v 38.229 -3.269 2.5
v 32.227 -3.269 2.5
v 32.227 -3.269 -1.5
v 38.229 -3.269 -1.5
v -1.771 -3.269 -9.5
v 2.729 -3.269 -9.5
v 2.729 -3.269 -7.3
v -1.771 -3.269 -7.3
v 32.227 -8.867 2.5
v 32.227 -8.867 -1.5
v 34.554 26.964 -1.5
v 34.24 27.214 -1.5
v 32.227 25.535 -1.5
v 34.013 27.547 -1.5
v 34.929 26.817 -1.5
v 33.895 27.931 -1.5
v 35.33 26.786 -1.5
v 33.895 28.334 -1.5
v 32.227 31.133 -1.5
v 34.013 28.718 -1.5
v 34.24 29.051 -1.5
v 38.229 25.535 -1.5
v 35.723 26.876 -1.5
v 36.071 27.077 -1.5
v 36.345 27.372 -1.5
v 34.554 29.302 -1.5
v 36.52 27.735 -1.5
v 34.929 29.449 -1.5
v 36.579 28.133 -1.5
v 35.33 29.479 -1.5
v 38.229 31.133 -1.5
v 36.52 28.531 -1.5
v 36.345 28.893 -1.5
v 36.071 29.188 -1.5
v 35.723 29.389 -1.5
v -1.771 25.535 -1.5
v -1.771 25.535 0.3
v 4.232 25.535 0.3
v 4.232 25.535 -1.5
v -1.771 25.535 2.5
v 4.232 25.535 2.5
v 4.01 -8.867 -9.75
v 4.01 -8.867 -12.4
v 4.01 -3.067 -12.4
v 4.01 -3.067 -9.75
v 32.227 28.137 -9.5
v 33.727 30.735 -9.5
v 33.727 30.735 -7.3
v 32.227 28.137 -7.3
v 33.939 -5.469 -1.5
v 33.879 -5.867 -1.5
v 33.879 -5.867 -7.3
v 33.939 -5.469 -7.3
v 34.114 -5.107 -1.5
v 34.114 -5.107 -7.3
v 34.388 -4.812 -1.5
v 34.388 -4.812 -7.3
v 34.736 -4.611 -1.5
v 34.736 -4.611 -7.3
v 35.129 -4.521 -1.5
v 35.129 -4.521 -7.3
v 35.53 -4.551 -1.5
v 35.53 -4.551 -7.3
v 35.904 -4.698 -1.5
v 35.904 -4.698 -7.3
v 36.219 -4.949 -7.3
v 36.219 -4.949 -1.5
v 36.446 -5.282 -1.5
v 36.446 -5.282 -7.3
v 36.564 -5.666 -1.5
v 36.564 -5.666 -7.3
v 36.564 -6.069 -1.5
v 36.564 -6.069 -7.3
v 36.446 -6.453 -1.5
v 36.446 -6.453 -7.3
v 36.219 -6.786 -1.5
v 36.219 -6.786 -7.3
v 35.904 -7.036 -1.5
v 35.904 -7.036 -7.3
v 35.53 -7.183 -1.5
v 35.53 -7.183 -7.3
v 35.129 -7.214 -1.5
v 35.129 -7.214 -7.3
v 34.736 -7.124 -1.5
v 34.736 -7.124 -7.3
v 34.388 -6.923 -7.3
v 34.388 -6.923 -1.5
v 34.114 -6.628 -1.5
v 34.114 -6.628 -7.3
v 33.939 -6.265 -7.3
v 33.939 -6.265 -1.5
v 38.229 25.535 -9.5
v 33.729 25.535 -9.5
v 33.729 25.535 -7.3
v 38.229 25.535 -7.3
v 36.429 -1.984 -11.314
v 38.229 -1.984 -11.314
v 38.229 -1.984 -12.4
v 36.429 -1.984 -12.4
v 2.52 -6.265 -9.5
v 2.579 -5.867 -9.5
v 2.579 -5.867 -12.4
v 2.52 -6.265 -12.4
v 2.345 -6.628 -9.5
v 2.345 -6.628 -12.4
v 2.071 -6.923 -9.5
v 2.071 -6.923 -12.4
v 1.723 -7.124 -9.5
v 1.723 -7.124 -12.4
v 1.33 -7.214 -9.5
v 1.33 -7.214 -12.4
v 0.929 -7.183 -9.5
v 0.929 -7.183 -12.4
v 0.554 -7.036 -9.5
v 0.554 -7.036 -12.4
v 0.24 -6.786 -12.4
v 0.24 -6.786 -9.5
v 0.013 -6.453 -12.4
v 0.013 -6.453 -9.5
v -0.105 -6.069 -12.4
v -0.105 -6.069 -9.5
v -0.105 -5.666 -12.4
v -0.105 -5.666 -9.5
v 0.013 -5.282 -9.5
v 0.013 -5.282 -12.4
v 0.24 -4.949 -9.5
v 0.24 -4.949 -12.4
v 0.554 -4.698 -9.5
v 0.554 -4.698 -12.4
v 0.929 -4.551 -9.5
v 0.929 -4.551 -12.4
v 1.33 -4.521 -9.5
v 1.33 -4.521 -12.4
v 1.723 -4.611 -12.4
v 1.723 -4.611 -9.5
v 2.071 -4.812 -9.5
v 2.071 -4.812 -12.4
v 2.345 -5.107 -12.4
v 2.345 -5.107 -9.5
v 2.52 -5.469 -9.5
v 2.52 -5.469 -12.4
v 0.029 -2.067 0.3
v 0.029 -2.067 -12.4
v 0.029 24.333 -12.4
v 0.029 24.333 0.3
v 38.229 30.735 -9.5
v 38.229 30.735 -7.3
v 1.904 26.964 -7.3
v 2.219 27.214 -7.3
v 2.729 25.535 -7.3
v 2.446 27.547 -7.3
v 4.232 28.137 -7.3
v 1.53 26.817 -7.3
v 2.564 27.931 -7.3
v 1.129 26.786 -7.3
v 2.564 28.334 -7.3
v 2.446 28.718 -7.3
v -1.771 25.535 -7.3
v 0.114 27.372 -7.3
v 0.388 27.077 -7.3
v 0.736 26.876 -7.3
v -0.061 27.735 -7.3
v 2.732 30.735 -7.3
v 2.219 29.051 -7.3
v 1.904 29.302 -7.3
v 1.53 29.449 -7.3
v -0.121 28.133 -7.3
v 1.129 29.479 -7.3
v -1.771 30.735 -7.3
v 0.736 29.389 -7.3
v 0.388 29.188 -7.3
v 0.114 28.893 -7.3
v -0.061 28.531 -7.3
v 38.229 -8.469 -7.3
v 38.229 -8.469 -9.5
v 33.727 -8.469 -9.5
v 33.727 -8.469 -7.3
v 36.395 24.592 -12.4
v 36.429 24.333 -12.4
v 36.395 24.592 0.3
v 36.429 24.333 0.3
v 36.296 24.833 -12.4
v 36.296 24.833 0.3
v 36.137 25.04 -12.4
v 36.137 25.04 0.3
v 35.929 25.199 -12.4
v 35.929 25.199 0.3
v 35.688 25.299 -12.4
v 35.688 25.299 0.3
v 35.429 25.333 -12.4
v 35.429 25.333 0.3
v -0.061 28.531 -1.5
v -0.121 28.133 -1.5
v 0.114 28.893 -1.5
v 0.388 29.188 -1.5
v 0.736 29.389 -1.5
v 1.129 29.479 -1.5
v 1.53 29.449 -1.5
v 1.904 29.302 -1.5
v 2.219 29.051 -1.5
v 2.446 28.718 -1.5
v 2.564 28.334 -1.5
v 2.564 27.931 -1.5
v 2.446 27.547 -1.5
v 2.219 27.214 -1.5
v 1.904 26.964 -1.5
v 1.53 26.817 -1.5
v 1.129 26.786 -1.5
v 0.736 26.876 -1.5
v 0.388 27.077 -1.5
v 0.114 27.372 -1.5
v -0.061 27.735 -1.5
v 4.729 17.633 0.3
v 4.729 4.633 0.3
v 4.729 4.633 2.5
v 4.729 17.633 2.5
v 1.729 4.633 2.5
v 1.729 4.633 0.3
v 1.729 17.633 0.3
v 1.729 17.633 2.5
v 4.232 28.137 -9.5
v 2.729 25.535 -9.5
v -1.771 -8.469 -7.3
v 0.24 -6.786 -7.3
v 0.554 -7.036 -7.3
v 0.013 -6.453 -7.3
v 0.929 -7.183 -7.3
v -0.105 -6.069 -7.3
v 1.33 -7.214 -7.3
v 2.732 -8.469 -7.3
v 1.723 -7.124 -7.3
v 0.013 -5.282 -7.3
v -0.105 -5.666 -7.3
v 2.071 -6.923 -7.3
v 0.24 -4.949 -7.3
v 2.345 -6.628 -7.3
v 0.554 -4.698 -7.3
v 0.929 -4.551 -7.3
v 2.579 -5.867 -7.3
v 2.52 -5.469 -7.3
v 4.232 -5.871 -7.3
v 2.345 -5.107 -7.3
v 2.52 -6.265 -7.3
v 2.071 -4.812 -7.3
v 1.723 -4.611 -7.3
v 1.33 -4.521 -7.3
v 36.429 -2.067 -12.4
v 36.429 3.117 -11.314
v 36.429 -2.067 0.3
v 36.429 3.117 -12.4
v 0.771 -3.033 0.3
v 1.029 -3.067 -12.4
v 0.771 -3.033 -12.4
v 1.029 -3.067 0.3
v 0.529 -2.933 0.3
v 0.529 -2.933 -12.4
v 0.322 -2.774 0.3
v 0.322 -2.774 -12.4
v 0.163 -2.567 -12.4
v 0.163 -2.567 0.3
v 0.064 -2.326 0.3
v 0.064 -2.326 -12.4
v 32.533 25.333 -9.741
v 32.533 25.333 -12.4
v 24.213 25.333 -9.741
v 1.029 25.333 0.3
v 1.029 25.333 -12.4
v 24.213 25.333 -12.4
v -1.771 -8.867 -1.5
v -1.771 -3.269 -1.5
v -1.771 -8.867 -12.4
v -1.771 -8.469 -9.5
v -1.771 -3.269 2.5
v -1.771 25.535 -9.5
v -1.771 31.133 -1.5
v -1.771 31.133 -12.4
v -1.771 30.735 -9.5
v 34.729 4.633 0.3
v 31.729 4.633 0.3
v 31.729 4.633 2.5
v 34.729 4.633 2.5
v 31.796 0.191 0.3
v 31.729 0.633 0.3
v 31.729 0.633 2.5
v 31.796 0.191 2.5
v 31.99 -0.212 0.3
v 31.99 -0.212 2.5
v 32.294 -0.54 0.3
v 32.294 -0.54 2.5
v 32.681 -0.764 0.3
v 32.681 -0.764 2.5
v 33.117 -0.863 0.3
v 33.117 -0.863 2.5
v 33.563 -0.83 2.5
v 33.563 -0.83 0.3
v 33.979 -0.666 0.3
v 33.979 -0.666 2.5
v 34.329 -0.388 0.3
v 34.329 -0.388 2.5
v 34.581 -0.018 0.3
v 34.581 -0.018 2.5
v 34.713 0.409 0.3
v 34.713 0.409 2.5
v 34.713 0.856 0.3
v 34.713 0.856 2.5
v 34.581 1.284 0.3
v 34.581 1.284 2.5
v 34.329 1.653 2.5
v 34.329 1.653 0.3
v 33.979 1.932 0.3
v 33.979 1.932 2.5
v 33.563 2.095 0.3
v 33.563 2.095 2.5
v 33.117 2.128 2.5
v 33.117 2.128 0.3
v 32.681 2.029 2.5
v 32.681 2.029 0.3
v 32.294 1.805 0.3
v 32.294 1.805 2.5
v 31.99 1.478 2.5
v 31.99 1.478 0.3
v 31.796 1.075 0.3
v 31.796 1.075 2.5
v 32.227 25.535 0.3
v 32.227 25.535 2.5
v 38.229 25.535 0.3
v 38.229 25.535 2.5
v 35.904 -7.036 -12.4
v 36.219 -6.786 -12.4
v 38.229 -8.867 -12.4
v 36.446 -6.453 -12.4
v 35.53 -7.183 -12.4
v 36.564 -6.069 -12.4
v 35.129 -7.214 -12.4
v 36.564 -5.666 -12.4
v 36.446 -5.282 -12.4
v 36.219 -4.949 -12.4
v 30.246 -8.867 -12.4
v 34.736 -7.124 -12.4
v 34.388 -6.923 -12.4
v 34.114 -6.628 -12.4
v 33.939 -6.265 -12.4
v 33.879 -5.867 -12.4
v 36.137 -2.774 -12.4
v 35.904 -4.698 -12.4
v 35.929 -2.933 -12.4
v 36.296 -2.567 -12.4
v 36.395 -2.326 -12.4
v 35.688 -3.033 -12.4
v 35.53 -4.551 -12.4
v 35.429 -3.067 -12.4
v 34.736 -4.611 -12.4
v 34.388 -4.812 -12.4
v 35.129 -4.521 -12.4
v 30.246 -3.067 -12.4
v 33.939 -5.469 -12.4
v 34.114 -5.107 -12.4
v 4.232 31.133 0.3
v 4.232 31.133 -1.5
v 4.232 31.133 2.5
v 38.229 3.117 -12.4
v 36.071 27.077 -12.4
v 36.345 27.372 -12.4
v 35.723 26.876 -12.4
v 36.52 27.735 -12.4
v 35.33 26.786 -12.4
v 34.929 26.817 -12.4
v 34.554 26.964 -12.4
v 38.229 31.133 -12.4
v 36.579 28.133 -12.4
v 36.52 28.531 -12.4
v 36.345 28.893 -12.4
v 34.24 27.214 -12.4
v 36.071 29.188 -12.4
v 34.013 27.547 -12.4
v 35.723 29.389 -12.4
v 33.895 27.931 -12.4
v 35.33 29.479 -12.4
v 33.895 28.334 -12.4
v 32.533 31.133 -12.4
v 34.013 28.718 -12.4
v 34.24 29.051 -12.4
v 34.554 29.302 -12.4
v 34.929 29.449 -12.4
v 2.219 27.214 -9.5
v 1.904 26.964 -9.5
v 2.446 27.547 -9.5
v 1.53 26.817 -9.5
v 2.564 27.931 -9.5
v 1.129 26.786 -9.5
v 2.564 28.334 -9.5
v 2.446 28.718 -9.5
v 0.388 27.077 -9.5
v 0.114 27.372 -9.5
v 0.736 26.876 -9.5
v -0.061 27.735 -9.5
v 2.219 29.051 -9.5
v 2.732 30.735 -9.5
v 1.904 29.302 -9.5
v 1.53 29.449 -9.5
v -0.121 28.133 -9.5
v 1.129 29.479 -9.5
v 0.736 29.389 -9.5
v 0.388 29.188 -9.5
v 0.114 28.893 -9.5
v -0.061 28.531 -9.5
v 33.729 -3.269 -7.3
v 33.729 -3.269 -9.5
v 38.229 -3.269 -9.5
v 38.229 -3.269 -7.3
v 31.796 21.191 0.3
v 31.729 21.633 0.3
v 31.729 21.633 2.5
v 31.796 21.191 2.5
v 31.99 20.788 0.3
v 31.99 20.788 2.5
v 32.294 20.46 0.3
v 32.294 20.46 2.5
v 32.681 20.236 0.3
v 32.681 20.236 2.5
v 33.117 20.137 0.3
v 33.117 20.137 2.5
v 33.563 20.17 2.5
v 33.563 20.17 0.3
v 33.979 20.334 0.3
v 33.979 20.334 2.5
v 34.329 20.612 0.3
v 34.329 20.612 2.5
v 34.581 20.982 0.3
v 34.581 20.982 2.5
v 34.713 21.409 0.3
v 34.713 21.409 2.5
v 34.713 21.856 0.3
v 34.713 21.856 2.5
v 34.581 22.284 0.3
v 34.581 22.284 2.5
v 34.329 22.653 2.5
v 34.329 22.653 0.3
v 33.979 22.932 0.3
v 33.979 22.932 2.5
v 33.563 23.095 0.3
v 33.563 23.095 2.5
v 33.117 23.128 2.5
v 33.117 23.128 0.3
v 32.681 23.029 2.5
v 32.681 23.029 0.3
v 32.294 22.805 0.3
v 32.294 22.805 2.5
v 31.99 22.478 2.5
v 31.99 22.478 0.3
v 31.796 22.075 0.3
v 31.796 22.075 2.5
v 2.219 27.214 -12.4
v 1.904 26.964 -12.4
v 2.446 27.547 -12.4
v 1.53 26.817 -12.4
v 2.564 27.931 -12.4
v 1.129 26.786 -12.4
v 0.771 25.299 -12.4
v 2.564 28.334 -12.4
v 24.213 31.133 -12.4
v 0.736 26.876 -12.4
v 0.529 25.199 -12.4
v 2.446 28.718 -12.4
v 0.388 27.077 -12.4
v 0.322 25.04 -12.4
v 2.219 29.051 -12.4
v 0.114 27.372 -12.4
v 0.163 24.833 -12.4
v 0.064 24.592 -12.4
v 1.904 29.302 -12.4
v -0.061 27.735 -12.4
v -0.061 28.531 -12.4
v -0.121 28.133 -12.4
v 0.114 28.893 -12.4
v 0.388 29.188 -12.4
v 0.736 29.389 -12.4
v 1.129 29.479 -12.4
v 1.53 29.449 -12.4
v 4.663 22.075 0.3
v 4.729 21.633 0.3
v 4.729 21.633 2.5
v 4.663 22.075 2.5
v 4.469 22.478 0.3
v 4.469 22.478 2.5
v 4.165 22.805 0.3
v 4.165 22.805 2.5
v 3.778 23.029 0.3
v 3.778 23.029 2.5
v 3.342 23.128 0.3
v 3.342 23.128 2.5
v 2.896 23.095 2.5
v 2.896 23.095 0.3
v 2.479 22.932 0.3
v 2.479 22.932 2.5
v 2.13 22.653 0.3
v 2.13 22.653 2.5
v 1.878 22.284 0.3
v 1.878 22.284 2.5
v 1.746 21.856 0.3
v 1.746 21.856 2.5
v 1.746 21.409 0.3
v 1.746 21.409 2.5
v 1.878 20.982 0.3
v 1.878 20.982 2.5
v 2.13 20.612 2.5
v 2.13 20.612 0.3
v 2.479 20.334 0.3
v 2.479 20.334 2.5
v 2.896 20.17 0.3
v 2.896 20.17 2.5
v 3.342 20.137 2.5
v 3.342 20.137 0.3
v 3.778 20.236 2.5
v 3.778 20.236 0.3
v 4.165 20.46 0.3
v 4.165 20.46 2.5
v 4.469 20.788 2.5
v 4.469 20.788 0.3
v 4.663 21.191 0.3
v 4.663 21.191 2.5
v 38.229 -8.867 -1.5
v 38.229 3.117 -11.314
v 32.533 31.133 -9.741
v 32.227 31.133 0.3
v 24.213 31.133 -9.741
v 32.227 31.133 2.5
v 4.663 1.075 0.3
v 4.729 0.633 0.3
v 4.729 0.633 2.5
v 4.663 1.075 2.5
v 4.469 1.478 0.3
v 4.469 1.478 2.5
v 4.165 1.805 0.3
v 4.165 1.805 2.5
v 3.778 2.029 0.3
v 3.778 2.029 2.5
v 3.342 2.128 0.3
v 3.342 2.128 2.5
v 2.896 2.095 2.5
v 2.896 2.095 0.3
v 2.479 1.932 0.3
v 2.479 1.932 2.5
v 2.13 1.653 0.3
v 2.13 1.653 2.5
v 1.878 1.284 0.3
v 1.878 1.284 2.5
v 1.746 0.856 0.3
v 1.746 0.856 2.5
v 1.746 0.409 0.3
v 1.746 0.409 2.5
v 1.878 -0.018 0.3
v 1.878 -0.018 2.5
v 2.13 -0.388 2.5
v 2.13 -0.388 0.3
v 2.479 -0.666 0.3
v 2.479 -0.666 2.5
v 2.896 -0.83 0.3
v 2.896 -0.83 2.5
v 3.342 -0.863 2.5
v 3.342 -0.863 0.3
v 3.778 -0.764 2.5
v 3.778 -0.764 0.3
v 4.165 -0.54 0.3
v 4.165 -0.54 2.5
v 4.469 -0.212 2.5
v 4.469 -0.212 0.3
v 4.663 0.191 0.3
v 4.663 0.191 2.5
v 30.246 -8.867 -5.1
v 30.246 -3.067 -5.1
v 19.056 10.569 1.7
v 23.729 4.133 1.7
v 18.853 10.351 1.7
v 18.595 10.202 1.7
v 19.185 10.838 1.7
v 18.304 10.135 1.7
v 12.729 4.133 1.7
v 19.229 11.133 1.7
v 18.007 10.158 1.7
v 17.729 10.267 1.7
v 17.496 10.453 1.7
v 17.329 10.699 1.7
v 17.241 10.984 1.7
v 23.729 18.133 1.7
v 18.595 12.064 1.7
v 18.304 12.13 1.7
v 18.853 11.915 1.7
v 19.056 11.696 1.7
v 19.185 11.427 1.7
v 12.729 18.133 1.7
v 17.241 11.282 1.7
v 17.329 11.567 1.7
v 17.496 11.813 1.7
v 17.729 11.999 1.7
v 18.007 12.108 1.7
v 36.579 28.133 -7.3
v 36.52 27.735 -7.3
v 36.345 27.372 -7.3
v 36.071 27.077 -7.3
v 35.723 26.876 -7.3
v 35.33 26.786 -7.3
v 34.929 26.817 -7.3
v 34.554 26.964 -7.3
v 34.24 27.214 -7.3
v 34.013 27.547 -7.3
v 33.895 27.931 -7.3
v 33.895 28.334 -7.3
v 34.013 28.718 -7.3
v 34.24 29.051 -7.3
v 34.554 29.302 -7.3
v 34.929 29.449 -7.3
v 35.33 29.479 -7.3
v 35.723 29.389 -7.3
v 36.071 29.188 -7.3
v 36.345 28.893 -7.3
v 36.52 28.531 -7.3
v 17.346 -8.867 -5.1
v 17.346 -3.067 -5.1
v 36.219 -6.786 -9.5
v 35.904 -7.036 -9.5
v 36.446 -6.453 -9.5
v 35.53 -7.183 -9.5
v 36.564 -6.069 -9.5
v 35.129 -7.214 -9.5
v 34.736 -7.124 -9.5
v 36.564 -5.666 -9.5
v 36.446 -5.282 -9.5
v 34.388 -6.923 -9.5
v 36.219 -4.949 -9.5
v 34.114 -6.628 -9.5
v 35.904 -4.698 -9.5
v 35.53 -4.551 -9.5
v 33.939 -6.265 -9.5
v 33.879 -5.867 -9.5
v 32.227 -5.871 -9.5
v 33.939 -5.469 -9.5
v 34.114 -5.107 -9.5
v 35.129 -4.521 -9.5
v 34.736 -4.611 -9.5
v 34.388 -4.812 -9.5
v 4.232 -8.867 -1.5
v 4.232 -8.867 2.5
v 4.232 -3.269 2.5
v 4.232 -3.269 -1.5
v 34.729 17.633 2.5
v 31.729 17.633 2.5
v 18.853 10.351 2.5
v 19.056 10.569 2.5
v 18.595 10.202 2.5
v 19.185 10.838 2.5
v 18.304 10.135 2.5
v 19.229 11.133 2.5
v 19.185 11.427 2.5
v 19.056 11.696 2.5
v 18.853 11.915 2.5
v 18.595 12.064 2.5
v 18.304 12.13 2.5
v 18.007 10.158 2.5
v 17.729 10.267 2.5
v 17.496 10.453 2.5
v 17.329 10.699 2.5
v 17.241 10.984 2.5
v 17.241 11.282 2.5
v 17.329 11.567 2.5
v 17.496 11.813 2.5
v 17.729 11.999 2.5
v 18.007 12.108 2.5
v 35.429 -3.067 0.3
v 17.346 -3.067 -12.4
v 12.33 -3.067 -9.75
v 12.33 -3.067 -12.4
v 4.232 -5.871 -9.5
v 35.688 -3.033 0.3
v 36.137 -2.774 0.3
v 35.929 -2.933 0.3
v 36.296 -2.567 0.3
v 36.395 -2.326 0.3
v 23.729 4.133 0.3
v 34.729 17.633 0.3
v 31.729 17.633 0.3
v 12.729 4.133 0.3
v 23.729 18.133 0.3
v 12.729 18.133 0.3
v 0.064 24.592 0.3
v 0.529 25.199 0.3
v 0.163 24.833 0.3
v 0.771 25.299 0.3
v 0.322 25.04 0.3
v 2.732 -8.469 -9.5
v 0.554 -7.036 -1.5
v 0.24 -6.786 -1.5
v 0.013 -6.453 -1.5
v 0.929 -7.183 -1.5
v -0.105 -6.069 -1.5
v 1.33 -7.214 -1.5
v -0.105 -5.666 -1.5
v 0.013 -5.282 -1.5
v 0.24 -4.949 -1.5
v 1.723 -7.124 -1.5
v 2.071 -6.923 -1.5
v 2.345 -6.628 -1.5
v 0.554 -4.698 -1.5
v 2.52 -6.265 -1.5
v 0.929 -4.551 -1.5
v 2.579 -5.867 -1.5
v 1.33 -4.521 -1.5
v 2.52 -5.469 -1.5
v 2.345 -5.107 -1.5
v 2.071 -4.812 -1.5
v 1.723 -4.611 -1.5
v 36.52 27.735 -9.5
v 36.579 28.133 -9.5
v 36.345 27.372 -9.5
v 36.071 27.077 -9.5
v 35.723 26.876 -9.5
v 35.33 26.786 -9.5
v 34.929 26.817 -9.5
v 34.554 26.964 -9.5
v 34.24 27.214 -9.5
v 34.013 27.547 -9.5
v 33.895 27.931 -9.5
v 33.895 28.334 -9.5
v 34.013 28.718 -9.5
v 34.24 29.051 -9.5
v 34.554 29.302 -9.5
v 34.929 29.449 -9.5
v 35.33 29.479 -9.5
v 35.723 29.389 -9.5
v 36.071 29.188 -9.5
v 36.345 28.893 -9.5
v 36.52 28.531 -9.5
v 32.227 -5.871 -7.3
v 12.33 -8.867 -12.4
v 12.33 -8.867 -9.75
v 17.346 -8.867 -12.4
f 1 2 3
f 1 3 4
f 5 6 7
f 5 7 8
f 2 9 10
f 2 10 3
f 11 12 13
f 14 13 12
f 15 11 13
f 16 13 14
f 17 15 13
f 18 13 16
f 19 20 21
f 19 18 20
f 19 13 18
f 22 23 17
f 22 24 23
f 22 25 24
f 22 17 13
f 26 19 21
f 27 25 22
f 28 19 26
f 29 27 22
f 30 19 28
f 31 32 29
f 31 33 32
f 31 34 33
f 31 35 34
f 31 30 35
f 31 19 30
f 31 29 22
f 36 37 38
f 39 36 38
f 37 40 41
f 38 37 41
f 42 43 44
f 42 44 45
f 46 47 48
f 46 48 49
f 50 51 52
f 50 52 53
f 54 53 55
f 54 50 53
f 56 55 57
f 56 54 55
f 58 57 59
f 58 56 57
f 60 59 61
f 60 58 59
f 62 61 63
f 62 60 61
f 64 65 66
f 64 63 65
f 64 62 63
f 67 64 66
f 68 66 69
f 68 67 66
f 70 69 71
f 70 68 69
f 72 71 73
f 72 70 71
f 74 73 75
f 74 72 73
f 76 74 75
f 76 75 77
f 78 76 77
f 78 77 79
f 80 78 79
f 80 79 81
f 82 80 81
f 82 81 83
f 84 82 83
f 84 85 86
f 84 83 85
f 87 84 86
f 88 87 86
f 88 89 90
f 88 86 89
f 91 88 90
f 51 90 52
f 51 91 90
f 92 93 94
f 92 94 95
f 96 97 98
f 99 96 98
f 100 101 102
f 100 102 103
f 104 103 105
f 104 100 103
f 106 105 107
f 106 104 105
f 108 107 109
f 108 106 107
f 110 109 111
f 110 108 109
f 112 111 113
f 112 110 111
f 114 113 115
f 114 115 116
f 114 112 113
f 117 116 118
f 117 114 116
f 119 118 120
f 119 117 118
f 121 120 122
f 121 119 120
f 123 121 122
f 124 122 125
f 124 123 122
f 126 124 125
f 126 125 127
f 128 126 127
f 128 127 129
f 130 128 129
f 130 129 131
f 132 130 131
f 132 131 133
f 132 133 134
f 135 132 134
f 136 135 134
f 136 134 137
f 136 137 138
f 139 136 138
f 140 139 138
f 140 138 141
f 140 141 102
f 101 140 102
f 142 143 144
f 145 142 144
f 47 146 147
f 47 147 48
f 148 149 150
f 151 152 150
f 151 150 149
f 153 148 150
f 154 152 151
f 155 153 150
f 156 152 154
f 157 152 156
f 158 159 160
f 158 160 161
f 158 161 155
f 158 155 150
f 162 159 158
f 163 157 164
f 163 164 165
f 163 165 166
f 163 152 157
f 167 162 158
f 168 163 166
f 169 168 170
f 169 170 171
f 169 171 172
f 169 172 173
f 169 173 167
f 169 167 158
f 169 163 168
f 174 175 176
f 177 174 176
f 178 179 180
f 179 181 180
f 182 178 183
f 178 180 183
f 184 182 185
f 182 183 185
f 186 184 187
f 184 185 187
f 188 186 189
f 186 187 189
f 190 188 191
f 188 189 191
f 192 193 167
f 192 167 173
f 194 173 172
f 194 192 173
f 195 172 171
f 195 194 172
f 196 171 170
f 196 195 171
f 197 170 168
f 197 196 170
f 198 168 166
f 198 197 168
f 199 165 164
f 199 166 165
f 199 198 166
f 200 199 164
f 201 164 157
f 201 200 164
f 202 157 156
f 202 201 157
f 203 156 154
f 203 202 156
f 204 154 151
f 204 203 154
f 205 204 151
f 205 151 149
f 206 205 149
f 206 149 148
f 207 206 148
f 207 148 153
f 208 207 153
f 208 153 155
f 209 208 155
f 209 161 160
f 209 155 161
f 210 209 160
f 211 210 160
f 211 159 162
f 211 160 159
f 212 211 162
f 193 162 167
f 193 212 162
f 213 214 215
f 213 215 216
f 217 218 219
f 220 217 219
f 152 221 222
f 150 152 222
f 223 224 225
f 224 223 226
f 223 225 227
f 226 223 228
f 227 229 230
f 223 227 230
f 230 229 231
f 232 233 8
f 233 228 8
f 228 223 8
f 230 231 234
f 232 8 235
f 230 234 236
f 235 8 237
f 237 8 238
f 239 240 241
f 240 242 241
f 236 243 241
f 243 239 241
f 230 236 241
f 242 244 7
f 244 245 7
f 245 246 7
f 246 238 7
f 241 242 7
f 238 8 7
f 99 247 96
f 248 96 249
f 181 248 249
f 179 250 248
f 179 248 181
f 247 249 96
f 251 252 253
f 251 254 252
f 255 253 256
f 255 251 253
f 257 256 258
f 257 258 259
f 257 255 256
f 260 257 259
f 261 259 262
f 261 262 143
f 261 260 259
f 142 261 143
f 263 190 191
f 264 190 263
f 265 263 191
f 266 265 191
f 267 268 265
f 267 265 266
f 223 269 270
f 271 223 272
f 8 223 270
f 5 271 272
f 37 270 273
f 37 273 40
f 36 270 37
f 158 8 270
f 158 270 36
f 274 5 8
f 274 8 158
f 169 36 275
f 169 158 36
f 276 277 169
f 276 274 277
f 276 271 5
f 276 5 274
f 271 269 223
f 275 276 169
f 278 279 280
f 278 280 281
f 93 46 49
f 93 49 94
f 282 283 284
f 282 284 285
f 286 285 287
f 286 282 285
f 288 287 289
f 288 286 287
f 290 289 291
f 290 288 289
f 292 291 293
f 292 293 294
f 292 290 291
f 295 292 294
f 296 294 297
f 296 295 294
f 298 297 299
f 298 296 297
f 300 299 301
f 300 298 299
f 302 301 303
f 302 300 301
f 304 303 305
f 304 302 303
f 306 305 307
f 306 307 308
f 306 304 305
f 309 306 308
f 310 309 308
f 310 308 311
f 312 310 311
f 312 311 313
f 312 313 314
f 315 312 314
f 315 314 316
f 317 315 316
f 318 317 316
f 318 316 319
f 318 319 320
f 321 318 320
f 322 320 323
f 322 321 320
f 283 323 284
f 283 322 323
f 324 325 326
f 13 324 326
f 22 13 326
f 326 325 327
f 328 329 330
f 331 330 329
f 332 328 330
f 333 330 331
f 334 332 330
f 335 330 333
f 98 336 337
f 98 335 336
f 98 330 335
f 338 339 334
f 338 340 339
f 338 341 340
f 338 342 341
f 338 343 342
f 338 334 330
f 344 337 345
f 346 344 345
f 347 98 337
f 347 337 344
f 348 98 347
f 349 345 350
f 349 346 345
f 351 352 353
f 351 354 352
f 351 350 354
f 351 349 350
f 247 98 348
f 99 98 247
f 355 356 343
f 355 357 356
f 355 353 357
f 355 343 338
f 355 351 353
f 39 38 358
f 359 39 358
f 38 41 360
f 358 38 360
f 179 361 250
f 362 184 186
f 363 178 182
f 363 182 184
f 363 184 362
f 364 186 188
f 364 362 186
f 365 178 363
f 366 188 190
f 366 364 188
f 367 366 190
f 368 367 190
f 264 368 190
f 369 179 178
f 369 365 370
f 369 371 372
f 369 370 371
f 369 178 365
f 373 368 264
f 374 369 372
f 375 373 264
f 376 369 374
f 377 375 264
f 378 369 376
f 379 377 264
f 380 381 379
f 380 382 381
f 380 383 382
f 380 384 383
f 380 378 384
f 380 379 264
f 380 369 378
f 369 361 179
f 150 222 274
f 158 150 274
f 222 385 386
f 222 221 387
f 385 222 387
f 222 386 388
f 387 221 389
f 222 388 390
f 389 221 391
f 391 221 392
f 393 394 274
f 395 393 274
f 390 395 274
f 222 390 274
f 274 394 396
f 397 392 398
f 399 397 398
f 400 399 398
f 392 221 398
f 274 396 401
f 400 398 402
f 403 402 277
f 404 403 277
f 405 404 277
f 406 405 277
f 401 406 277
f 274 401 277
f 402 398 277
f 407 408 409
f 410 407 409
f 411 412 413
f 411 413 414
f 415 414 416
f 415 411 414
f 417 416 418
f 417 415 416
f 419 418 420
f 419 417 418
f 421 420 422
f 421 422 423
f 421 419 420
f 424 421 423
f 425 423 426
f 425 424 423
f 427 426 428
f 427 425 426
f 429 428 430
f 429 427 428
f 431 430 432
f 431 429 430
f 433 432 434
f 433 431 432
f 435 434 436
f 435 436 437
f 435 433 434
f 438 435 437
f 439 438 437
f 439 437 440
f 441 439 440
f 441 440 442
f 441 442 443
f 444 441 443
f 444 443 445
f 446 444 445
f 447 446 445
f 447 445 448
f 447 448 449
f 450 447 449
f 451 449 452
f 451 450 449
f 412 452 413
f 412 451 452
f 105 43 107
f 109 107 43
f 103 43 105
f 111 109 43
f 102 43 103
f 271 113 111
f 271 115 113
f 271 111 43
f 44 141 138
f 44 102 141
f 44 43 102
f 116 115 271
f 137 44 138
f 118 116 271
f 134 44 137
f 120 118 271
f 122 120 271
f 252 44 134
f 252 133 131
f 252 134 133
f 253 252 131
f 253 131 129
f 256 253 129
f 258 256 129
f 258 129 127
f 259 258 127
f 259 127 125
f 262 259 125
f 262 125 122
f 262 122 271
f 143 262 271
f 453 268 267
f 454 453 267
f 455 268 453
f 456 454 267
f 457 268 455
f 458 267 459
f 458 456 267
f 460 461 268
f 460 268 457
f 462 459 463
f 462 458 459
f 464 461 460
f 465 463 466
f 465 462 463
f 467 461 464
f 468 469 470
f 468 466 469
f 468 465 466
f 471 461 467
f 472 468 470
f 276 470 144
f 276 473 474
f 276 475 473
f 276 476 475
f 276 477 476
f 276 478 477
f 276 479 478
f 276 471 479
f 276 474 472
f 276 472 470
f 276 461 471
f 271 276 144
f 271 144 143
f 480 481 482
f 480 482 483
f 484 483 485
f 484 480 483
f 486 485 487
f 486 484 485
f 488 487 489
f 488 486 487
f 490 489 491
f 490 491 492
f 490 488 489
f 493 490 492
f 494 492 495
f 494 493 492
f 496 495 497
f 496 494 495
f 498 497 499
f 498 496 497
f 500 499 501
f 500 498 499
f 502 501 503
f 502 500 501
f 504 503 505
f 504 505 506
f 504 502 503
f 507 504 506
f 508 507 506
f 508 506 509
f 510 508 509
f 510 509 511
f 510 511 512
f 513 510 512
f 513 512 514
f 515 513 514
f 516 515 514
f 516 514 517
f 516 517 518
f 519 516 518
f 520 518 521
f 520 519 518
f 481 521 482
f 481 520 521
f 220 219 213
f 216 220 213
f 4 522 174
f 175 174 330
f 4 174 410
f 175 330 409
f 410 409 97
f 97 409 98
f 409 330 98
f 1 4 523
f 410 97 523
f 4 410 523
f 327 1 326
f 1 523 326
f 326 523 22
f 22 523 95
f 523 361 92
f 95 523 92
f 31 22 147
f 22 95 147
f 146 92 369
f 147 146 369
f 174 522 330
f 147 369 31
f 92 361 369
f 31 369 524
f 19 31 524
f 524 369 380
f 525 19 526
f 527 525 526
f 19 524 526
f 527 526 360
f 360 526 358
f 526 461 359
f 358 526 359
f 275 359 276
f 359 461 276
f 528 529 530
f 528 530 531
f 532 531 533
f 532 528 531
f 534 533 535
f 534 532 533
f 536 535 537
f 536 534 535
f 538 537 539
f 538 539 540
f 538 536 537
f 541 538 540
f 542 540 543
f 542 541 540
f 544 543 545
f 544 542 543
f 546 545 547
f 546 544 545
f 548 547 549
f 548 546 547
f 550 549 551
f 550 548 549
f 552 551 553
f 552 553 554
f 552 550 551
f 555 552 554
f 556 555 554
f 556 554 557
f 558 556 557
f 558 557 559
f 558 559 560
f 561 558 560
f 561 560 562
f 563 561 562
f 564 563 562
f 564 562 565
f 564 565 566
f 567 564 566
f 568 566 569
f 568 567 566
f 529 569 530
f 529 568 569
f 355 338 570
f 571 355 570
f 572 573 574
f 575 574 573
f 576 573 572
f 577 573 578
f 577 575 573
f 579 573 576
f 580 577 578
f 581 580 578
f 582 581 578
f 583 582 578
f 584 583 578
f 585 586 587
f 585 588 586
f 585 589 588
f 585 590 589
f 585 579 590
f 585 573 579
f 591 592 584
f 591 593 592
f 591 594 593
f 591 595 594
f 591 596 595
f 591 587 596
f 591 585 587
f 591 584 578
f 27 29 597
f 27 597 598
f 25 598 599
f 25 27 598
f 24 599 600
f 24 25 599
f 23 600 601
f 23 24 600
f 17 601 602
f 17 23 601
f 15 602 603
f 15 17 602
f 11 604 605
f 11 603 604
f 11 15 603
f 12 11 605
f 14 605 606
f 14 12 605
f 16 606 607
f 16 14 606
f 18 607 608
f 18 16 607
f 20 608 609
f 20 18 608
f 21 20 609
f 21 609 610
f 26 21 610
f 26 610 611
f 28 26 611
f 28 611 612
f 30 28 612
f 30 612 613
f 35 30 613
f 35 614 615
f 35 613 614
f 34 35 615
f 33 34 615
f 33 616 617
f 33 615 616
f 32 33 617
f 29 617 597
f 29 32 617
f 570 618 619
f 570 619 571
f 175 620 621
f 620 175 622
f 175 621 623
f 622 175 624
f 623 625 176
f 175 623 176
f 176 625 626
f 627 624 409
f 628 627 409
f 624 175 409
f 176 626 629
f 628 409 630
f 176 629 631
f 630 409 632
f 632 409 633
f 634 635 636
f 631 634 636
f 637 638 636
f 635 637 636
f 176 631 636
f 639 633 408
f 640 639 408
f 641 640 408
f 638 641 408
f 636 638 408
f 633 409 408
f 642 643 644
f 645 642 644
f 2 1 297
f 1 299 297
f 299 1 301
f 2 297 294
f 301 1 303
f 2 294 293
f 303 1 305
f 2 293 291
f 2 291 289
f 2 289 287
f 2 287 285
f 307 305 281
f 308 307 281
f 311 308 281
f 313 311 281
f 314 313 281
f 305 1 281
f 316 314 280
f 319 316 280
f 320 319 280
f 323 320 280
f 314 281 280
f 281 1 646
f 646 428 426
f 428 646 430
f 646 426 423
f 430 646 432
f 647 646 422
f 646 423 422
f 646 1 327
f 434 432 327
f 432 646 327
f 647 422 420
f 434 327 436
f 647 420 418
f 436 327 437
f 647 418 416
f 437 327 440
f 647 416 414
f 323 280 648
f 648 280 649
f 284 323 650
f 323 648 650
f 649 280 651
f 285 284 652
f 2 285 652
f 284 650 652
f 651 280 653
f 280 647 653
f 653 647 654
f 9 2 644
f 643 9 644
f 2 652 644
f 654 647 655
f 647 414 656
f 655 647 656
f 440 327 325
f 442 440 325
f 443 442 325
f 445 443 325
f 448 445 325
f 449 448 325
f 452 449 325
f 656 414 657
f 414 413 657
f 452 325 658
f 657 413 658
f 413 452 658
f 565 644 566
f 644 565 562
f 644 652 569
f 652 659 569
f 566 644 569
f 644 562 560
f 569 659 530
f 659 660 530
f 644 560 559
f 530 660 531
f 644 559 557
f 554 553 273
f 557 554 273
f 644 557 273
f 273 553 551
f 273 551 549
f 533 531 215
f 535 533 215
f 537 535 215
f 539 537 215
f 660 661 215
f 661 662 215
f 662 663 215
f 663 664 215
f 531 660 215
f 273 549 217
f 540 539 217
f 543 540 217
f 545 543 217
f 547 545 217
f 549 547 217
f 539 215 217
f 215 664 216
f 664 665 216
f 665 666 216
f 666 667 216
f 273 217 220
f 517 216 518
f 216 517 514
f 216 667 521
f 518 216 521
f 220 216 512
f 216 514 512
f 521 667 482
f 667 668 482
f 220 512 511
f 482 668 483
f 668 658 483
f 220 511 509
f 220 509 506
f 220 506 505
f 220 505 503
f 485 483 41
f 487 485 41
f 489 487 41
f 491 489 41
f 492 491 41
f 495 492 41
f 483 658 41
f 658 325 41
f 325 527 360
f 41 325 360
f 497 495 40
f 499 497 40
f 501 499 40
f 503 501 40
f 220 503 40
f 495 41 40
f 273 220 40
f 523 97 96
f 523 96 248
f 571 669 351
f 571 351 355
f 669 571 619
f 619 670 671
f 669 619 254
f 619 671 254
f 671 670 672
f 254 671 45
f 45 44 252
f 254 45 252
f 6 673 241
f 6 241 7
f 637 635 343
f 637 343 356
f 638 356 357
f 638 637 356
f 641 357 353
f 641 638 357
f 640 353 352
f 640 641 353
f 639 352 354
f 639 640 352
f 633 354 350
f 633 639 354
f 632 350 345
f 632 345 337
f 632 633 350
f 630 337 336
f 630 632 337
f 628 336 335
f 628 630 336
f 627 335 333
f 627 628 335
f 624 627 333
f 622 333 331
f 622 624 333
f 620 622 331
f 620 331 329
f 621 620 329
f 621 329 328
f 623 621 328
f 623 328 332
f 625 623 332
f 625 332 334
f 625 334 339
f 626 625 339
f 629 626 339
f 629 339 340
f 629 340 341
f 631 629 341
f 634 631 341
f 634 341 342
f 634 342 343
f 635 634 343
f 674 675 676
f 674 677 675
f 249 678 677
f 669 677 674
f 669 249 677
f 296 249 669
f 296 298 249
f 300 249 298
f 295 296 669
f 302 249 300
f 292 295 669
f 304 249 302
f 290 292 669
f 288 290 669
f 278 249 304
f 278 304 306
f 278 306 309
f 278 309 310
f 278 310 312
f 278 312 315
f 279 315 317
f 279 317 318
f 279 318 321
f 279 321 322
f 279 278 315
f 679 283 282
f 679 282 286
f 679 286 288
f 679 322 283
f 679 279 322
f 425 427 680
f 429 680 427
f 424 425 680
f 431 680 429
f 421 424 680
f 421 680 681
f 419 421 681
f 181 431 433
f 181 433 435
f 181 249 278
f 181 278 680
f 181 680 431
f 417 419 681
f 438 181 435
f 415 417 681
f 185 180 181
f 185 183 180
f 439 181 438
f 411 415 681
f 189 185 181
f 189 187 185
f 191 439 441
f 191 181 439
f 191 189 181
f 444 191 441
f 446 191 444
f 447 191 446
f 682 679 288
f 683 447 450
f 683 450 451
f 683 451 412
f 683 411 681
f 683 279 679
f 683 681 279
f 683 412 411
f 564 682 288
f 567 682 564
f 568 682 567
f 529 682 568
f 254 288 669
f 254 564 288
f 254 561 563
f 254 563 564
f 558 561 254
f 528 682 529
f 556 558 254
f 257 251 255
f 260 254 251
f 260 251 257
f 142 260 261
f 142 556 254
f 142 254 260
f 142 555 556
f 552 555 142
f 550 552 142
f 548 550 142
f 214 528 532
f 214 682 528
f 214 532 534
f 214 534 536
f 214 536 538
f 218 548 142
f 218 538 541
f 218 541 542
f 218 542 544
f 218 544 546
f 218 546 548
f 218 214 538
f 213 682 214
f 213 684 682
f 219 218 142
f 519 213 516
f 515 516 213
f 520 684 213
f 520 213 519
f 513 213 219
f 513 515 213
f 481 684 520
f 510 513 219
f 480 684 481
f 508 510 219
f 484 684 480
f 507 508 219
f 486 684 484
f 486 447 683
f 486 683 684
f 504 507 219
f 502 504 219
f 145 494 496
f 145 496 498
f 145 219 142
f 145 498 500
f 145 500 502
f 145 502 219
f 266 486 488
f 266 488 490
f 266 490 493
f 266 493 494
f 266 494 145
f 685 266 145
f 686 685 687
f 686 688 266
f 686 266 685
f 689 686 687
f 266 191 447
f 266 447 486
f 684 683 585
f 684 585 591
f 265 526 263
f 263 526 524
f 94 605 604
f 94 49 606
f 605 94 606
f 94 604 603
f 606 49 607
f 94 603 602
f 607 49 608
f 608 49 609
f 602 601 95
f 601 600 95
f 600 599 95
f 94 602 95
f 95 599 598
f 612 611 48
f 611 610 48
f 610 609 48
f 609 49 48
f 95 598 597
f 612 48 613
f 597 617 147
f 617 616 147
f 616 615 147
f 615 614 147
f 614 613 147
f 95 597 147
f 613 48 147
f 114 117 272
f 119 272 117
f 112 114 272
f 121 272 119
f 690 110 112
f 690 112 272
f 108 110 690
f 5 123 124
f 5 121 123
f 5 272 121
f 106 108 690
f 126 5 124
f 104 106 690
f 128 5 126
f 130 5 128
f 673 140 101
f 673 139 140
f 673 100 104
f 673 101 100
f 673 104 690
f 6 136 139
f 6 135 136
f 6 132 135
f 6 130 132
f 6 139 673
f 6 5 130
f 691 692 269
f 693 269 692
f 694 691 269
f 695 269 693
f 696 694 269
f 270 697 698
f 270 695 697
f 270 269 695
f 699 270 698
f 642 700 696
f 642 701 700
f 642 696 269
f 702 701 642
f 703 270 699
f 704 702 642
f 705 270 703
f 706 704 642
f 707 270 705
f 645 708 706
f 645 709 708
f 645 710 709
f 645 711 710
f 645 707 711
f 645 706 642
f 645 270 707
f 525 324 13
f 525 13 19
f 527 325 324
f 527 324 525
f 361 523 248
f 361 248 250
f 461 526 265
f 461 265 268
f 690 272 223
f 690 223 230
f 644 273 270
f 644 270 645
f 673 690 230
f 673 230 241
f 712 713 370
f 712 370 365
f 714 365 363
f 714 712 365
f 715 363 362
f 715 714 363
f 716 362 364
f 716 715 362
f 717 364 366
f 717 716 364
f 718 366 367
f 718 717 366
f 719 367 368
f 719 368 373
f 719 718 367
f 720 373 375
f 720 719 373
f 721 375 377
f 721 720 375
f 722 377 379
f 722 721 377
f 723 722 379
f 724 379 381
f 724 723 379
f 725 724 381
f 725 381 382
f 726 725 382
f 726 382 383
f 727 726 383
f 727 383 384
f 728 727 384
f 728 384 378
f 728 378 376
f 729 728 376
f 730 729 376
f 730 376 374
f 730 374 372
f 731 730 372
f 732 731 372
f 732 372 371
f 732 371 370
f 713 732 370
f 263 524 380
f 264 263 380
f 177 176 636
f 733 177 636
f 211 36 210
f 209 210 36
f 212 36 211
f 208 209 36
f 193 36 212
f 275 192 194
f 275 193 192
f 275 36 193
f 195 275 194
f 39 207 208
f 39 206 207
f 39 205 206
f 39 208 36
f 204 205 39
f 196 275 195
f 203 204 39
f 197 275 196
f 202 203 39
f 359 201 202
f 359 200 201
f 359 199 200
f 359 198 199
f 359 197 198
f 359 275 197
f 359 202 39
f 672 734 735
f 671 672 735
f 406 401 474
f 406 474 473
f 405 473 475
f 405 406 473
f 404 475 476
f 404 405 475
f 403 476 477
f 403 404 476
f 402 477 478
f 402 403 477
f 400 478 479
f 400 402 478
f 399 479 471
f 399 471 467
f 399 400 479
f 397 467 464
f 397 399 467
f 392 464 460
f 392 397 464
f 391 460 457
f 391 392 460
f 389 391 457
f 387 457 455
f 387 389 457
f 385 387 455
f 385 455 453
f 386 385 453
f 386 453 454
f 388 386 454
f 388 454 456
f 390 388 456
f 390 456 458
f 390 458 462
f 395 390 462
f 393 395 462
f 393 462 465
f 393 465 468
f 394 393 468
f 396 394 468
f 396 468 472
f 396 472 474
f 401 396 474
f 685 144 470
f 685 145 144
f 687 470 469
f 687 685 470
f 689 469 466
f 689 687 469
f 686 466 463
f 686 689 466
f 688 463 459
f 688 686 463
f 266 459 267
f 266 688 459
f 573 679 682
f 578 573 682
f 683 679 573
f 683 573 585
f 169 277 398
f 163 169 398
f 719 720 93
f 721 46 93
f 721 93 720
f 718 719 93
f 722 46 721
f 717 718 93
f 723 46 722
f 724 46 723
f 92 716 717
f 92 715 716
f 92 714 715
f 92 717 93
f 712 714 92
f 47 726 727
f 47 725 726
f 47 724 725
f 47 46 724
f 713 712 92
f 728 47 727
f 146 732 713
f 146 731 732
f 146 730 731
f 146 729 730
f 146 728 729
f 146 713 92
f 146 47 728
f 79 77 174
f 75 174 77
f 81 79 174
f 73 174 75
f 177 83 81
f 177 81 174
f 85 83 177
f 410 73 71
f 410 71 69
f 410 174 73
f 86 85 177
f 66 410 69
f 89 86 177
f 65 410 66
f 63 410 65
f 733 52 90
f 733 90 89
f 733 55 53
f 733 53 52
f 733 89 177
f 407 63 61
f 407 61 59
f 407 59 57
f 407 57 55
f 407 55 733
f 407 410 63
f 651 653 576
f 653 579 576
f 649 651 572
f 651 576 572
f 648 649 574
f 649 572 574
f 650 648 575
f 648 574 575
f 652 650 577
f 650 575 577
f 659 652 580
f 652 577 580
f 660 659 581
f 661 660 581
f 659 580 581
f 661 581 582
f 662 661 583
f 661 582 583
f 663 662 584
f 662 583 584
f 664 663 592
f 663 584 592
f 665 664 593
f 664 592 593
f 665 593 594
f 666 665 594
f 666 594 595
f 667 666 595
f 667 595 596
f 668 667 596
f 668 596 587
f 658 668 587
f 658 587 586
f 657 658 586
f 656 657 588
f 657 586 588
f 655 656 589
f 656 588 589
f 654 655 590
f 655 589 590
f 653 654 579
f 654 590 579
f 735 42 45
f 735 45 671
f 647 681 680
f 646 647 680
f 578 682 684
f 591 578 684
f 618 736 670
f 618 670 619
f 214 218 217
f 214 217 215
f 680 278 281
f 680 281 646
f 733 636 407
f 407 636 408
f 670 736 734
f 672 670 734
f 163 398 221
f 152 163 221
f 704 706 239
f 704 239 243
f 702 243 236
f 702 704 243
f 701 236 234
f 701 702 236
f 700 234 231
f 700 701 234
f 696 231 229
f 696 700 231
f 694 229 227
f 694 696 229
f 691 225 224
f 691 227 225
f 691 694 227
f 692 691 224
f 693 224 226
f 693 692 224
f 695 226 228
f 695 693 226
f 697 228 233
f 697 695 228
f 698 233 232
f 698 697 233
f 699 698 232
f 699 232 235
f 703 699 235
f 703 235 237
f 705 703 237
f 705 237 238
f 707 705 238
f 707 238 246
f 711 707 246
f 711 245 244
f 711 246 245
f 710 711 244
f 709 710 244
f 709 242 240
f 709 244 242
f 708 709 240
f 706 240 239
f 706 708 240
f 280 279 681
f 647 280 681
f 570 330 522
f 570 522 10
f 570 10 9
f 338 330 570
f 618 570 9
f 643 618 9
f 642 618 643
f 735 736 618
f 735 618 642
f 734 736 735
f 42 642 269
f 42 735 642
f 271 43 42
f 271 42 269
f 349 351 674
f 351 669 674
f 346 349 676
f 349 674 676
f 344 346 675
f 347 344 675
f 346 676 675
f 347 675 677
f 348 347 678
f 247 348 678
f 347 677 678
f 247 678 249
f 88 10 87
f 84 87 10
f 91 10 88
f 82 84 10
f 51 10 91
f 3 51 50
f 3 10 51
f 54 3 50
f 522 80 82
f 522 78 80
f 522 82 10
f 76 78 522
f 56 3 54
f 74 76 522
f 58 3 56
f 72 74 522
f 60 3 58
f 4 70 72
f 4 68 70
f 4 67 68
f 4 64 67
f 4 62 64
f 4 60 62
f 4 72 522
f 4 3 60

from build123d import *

# Parameters (mm, degrees)
SKETCH_1_W               = 40
SKETCH_1_H               = 40
EXTRUDE_1_DEPTH          = 12.7
CUT_EXTRUDE_2_DEPTH      = 0.7
CUT_EXTRUDE_2_DEPTH_BACK = 1.5
SKETCH_8_W               = 36.4
SKETCH_8_H               = 28.4
CUT_EXTRUDE_4_DEPTH      = 12.7
SKETCH_10_R              = 0.5
SKETCH_10_R_2            = 1.5
SKETCH_10_W              = 3
SKETCH_10_H              = 13
EXTRUDE_2_DEPTH          = 2.2
CUT_EXTRUDE_START        = -12.7
SKETCH_13_R              = 1.35
CUT_EXTRUDE_6_DEPTH      = 12.7
FILLET_1_R               = 1
SKETCH_14_W              = 8.31999735
SKETCH_14_H              = 2.64999918
CUT_EXTRUDE_8_DEPTH      = 5.8
SKETCH_15_W              = 12.8999835
SKETCH_15_H              = 7.3
CUT_EXTRUDE_9_DEPTH      = 5.8
SKETCH_16_W              = 1.085536683
SKETCH_16_H              = 5.100270408
CUT_EXTRUDE_10_DEPTH     = 1.8
SKETCH_17_W              = 8.31999735
SKETCH_17_H              = 2.65925193
CUT_EXTRUDE_11_DEPTH     = 5.8
SKETCH_23_W              = 6.0022214
SKETCH_23_H              = 5.598076211
SKETCH_23_H_2            = 5.598076212
CUT_EXTRUDE_12_DEPTH     = 4
SKETCH_24_W              = 11
SKETCH_24_H              = 14
CUT_EXTRUDE_14_DEPTH     = 1.4
SKETCH_22_W              = 1
SKETCH_22_H              = 0.8


with BuildPart() as part:
    # 草图1 → 凸台-拉伸1 (new body)
    with BuildSketch(Plane(origin=(0, 0, -12.4), x_dir=(-1, 0, 0), z_dir=(0, 0, -1))):
        with Locations((-18.22949197, 11.132690632)):
            Rectangle(SKETCH_1_W, SKETCH_1_H)
    extrude(amount=-EXTRUDE_1_DEPTH)

    # 草图2 → 切除-拉伸2 (cut, two sides: drawn at the far end of the back side and taken through both)
    with BuildSketch(Plane.XY.offset(-8).offset(-CUT_EXTRUDE_2_DEPTH_BACK)):
        Polygon((-2.01828663, -8.469233156), (2.73171337, -8.469233156), (4.23171337, -5.871156945), (2.72949197, -3.269233156), (-2.01828663, -3.269233156), align=None)
        Polygon((-2.01828663, 25.534614421), (-2.01828663, 30.734614421), (2.73171337, 30.734614421), (4.23171337, 28.13653821), (2.72949197, 25.534614421), align=None)
        Polygon((38.47727057, 30.734614421), (33.72727057, 30.734614421), (32.22727057, 28.13653821), (33.72949197, 25.534614421), (38.47727057, 25.534614421), align=None)
        Polygon((38.47727057, -3.269233156), (38.47727057, -8.469233156), (33.72727057, -8.469233156), (32.22727057, -5.871156945), (33.72949197, -3.269233156), align=None)
    extrude(amount=CUT_EXTRUDE_2_DEPTH + CUT_EXTRUDE_2_DEPTH_BACK, mode=Mode.SUBTRACT)

    # 草图8 → 切除-拉伸4 (cut)
    with BuildSketch(Plane(origin=(0, 0, -12.4), x_dir=(-1, 0, 0), z_dir=(0, 0, -1))):
        with Locations((-18.22949197, 11.132690632)):
            Rectangle(SKETCH_8_W, SKETCH_8_H)
    extrude(amount=-CUT_EXTRUDE_4_DEPTH, mode=Mode.SUBTRACT)

    # 草图13 → 切除-拉伸6 (cut)
    with BuildSketch(Plane(origin=(0, 0, -12.4), x_dir=(-1, 0, 0), z_dir=(0, 0, -1)).offset(CUT_EXTRUDE_START)):
        with Locations((-35.22949197, -5.867309368)):
            Circle(SKETCH_13_R)
        with Locations(Location((-1.22949197, -5.867309368, 0), (0, 0, 180))):
            Circle(SKETCH_13_R)
        with Locations((-1.22949197, 28.132690632)):
            Circle(SKETCH_13_R)
        with Locations(Location((-35.22949197, 28.132690632, 0), (0, 0, 180))):
            Circle(SKETCH_13_R)
    extrude(amount=CUT_EXTRUDE_6_DEPTH, mode=Mode.SUBTRACT)

    # 圆角1
    fillet_1_edges = [part.edges().sort_by_distance(p)[0] for p in [
        (0.02949197, 25.332690632, -6.05),
        (0.02949197, -3.067309368, -6.05),
        (36.42949197, -3.067309368, -6.05),
        (36.42949197, 25.332690632, -6.05),
    ]]
    fillet(fillet_1_edges, radius=FILLET_1_R)

    # 草图14 → 切除-拉伸8 (cut)
    with BuildSketch(Plane.XZ.offset(8.867309368)):
        with Locations((8.169941285, -11.07500041)):
            Rectangle(SKETCH_14_W, SKETCH_14_H)
    extrude(amount=-CUT_EXTRUDE_8_DEPTH, mode=Mode.SUBTRACT)

    # 草图15 → 切除-拉伸9 (cut)
    with BuildSketch(Plane.XZ.offset(8.867309368)):
        with Locations((23.79587104, -8.75)):
            Rectangle(SKETCH_15_W, SKETCH_15_H)
    extrude(amount=-CUT_EXTRUDE_9_DEPTH, mode=Mode.SUBTRACT)

    # 草图16 → 切除-拉伸10 (cut)
    with BuildSketch(Plane(origin=(38.22949197, 0, 0), x_dir=(0, 0, -1), z_dir=(1, 0, 0))):
        with Locations((11.857231659, 0.566559812)):
            Rectangle(SKETCH_16_W, SKETCH_16_H)
    extrude(amount=-CUT_EXTRUDE_10_DEPTH, mode=Mode.SUBTRACT)

    # 草图17 → 切除-拉伸11 (cut)
    with BuildSketch(Plane(origin=(0, 31.132690632, 0), x_dir=(1, 0, 0), z_dir=(0, 1, 0))):
        with Locations((28.372981895, 11.070374035)):
            Rectangle(SKETCH_17_W, SKETCH_17_H)
    extrude(amount=-CUT_EXTRUDE_11_DEPTH, mode=Mode.SUBTRACT)

    # 草图23 → 切除-拉伸12 (cut)
    with BuildSketch(Plane.XY.offset(2.5)):
        with Locations((35.22838127, 28.333652527)):
            Rectangle(SKETCH_23_W, SKETCH_23_H)
        with Locations((35.22838127, -6.068271262)):
            Rectangle(SKETCH_23_W, SKETCH_23_H_2)
        with Locations((1.23060267, -6.068271262)):
            Rectangle(SKETCH_23_W, SKETCH_23_H_2)
        with Locations((1.23060267, 28.333652527)):
            Rectangle(SKETCH_23_W, SKETCH_23_H)
    extrude(amount=-CUT_EXTRUDE_12_DEPTH, mode=Mode.SUBTRACT)


with BuildPart() as body_2:
    # 草图10 → 凸台-拉伸2 (new body)
    with BuildSketch(Plane.XY.offset(0.3)):
        Polygon((-1.77050803, 25.534614421), (4.23171337, 25.534614421), (4.23171337, 31.132690632), (32.22727057, 31.132690632), (32.22727057, 25.534614421), (38.22949197, 25.534614421), (38.22949197, -3.269233156), (32.22727057, -3.269233156), (32.22727057, -8.867309368), (4.23171337, -8.867309368), (4.23171337, -3.269233156), (-1.77050803, -3.269233156), align=None)
        with Locations((18.22949197, 11.132690632)):
            Circle(SKETCH_10_R, mode=Mode.SUBTRACT)
        with Locations((3.22949197, 0.632690632)):
            Circle(SKETCH_10_R_2, mode=Mode.SUBTRACT)
        with Locations((3.22949197, 21.632690632)):
            Circle(SKETCH_10_R_2, mode=Mode.SUBTRACT)
        with Locations(Location((33.22949197, 21.632690632, 0), (0, 0, 180))):
            Circle(SKETCH_10_R_2, mode=Mode.SUBTRACT)
        with Locations(Location((33.22949197, 0.632690632, 0), (0, 0, 180))):
            Circle(SKETCH_10_R_2, mode=Mode.SUBTRACT)
        with Locations((3.22949197, 11.132690632)):
            Rectangle(SKETCH_10_W, SKETCH_10_H, mode=Mode.SUBTRACT)
        with Locations((33.22949197, 11.132690632)):
            Rectangle(SKETCH_10_W, SKETCH_10_H, mode=Mode.SUBTRACT)
    extrude(amount=EXTRUDE_2_DEPTH)

    # 草图24 → 切除-拉伸14 (cut)
    with BuildSketch(Plane(origin=(0, 0, 0.3), x_dir=(-1, 0, 0), z_dir=(0, 0, -1))):
        with Locations((-18.22949197, 11.132690632)):
            Rectangle(SKETCH_24_W, SKETCH_24_H)
    extrude(amount=-CUT_EXTRUDE_14_DEPTH, mode=Mode.SUBTRACT)

    # 草图22 → 切除-旋转3 (revolve, cut)
    with BuildSketch(Plane(origin=(0, 11.132690632, 0), x_dir=(-1, 0, 0), z_dir=(0, -1, 0))):
        with Locations((-18.72949197, -2.1)):
            Rectangle(SKETCH_22_W, SKETCH_22_H)
    revolve(axis=Axis((18.22949197, 11.132690632, 5.06186702), (0, 0, -1)), mode=Mode.SUBTRACT)

    # Combine 1: union part
    add(part.part)


solid = body_2.part
